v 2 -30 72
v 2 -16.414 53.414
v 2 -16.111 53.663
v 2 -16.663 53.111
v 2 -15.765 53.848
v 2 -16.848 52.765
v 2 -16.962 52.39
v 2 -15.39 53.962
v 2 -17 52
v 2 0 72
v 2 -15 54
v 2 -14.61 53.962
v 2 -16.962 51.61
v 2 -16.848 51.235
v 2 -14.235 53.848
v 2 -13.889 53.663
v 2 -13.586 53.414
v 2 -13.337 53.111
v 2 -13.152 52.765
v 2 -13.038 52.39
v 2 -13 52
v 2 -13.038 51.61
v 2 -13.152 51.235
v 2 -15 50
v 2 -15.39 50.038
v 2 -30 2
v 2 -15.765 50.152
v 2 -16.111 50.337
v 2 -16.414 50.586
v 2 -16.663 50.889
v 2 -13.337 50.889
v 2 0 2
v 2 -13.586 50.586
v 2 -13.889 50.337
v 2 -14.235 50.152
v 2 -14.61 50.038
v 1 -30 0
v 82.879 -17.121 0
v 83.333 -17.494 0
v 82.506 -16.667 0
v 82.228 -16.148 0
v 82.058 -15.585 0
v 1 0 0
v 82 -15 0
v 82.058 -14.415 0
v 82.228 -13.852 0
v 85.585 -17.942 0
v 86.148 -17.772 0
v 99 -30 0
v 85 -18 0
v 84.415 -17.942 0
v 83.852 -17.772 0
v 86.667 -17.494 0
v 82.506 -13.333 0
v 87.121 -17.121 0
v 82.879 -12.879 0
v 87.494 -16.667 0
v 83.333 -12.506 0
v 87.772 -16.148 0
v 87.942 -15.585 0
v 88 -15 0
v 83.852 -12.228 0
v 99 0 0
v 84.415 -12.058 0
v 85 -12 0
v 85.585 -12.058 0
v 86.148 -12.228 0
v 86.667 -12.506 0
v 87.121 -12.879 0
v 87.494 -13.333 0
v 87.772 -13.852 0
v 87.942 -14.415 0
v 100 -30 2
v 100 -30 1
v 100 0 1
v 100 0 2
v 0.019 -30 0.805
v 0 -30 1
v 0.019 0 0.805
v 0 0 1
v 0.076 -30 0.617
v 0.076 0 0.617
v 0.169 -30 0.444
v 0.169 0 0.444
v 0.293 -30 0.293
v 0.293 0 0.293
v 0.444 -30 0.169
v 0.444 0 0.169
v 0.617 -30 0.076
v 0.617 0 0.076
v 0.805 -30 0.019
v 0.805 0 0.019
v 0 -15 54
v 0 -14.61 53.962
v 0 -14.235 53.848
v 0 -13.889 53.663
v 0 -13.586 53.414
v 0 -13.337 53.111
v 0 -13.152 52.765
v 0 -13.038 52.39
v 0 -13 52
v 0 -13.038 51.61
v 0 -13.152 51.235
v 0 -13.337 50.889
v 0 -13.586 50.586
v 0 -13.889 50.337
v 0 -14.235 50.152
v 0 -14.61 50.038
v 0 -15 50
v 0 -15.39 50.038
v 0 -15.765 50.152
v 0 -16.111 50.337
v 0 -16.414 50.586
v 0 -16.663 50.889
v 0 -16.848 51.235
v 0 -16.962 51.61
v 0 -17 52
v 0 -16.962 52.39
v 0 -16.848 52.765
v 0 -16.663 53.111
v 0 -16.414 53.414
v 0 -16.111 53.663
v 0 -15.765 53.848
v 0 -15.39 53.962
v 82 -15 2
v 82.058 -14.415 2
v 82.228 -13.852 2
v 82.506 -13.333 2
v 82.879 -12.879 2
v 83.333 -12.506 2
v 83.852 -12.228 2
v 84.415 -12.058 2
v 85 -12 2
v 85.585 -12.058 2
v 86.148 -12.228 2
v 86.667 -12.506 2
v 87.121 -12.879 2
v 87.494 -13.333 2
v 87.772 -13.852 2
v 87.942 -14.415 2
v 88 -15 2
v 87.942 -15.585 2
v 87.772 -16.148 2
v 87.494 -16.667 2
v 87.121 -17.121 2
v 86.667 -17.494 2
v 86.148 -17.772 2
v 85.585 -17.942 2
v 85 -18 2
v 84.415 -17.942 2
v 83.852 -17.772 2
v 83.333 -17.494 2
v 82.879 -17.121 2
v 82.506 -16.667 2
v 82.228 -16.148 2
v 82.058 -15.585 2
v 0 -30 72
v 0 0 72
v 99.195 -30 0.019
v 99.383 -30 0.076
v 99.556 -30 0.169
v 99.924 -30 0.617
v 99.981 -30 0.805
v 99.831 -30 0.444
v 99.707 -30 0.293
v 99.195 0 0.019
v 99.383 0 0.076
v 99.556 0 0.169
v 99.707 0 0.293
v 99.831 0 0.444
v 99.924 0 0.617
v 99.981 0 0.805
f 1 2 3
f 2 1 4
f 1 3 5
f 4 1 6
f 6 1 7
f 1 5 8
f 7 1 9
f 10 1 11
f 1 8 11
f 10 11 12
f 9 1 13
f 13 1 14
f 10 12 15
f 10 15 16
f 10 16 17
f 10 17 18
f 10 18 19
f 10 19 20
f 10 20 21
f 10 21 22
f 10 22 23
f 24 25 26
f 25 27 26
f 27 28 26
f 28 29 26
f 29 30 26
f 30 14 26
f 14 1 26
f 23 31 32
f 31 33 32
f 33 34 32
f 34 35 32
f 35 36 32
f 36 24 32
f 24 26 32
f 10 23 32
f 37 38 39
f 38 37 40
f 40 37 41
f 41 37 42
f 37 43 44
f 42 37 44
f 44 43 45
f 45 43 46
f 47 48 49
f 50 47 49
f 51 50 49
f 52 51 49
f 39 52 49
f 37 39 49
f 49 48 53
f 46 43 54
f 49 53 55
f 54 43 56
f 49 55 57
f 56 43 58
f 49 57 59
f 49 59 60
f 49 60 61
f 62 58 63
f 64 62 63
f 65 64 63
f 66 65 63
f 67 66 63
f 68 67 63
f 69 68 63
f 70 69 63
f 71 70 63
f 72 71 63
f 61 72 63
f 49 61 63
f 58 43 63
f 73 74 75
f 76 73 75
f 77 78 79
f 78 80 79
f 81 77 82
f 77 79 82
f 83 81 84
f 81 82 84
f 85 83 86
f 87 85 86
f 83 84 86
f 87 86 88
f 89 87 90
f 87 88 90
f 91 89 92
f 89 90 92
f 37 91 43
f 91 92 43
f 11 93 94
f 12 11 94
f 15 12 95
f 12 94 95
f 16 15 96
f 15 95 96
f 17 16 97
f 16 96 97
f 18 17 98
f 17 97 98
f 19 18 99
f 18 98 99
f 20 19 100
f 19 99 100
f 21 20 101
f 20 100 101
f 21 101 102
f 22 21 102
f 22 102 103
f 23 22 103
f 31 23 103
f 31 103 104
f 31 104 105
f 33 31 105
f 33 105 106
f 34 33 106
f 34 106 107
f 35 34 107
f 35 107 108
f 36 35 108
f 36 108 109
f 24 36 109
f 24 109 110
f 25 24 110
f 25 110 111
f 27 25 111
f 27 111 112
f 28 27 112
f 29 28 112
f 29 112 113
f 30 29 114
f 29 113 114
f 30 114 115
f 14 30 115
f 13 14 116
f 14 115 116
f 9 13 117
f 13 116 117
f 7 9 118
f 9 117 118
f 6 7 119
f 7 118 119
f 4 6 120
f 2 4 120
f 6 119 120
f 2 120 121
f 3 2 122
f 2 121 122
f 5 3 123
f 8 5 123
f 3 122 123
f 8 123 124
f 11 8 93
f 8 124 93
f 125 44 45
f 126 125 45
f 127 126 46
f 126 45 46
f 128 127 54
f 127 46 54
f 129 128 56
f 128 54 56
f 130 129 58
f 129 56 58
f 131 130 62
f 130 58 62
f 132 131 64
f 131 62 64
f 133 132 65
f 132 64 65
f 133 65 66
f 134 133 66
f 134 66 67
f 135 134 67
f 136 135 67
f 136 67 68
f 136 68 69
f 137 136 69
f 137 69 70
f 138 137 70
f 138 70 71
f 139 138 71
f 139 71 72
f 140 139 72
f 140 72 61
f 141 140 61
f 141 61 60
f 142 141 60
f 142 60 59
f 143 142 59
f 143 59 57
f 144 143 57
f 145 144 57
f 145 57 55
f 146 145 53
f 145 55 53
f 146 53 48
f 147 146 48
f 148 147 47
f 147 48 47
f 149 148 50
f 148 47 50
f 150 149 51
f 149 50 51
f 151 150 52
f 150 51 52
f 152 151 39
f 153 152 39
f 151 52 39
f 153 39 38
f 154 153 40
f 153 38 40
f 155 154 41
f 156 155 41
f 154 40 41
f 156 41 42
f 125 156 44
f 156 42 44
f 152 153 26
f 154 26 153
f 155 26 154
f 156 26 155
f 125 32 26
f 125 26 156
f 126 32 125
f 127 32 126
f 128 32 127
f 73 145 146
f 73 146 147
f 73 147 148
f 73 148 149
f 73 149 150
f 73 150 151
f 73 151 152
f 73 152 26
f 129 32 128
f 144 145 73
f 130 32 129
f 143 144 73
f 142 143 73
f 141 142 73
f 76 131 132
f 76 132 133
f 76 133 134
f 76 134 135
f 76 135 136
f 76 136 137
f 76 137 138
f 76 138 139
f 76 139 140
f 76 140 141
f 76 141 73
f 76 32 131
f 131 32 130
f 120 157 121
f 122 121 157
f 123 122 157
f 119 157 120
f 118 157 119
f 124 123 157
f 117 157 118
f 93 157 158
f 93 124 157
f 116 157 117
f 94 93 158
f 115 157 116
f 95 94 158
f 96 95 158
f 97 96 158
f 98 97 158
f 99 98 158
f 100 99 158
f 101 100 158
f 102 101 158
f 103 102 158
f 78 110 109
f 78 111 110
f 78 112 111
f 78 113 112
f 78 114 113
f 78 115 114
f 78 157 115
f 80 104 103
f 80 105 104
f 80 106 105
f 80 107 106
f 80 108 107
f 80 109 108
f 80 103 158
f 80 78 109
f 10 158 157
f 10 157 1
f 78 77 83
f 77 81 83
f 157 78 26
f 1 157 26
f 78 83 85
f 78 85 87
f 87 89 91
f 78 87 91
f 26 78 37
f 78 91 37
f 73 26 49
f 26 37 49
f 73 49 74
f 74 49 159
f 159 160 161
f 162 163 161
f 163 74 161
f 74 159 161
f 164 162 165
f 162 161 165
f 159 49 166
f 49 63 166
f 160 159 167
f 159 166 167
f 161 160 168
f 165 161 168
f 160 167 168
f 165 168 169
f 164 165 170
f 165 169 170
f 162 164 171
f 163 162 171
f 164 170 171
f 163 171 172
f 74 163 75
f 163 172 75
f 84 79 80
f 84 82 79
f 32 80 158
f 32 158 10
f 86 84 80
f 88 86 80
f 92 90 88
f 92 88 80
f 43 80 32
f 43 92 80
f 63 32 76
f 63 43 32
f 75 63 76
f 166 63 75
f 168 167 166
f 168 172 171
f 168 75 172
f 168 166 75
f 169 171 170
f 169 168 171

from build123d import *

# Parameters (mm, degrees)
ESQUISSE1_W             = 100
ESQUISSE1_H             = 30
BOSS_EXTRU_1_DEPTH      = 2
ESQUISSE2_W             = 2
ESQUISSE2_H             = 30
BOSS_EXTRU_2_DEPTH      = 70
ESQUISSE4_R             = 2
ENL_V_MAT_EXTRU_1_DEPTH = 101
CONG_1_R                = 1
CONG_2_R                = 1
ESQUISSE5_R             = 3
ENL_V_MAT_EXTRU_2_DEPTH = 10


with BuildPart() as part:
    # Esquisse1 → Boss.-Extru.1 (new body)
    with BuildSketch(Plane.XY):
        with Locations((50, -15)):
            Rectangle(ESQUISSE1_W, ESQUISSE1_H)
    extrude(amount=BOSS_EXTRU_1_DEPTH)

    # Esquisse2 → Boss.-Extru.2 (add)
    with BuildSketch(Plane.XY.offset(2)):
        with Locations((1, -15)):
            Rectangle(ESQUISSE2_W, ESQUISSE2_H)
    extrude(amount=BOSS_EXTRU_2_DEPTH)

    # Esquisse4 → Enlèv. mat.-Extru.1 (cut, through all)
    with BuildSketch(Plane.ZY):
        with Locations((52, -15)):
            Circle(ESQUISSE4_R)
    extrude(amount=-ENL_V_MAT_EXTRU_1_DEPTH, mode=Mode.SUBTRACT)

    # Congé1
    cong_1_edges = [part.edges().sort_by_distance(p)[0] for p in [
        (0, -15, 0),
    ]]
    fillet(cong_1_edges, radius=CONG_1_R)

    # Congé2
    cong_2_edges = [part.edges().sort_by_distance(p)[0] for p in [
        (100, -15, 0),
    ]]
    fillet(cong_2_edges, radius=CONG_2_R)

    # Esquisse5 → Enlèv. mat.-Extru.2 (cut)
    with BuildSketch(Plane(origin=(0, 0, 0), x_dir=(-1, 0, 0), z_dir=(0, 0, -1))):
        with Locations((-85, -15)):
            Circle(ESQUISSE5_R)
    extrude(amount=-ENL_V_MAT_EXTRU_2_DEPTH, mode=Mode.SUBTRACT)


solid = part.part
